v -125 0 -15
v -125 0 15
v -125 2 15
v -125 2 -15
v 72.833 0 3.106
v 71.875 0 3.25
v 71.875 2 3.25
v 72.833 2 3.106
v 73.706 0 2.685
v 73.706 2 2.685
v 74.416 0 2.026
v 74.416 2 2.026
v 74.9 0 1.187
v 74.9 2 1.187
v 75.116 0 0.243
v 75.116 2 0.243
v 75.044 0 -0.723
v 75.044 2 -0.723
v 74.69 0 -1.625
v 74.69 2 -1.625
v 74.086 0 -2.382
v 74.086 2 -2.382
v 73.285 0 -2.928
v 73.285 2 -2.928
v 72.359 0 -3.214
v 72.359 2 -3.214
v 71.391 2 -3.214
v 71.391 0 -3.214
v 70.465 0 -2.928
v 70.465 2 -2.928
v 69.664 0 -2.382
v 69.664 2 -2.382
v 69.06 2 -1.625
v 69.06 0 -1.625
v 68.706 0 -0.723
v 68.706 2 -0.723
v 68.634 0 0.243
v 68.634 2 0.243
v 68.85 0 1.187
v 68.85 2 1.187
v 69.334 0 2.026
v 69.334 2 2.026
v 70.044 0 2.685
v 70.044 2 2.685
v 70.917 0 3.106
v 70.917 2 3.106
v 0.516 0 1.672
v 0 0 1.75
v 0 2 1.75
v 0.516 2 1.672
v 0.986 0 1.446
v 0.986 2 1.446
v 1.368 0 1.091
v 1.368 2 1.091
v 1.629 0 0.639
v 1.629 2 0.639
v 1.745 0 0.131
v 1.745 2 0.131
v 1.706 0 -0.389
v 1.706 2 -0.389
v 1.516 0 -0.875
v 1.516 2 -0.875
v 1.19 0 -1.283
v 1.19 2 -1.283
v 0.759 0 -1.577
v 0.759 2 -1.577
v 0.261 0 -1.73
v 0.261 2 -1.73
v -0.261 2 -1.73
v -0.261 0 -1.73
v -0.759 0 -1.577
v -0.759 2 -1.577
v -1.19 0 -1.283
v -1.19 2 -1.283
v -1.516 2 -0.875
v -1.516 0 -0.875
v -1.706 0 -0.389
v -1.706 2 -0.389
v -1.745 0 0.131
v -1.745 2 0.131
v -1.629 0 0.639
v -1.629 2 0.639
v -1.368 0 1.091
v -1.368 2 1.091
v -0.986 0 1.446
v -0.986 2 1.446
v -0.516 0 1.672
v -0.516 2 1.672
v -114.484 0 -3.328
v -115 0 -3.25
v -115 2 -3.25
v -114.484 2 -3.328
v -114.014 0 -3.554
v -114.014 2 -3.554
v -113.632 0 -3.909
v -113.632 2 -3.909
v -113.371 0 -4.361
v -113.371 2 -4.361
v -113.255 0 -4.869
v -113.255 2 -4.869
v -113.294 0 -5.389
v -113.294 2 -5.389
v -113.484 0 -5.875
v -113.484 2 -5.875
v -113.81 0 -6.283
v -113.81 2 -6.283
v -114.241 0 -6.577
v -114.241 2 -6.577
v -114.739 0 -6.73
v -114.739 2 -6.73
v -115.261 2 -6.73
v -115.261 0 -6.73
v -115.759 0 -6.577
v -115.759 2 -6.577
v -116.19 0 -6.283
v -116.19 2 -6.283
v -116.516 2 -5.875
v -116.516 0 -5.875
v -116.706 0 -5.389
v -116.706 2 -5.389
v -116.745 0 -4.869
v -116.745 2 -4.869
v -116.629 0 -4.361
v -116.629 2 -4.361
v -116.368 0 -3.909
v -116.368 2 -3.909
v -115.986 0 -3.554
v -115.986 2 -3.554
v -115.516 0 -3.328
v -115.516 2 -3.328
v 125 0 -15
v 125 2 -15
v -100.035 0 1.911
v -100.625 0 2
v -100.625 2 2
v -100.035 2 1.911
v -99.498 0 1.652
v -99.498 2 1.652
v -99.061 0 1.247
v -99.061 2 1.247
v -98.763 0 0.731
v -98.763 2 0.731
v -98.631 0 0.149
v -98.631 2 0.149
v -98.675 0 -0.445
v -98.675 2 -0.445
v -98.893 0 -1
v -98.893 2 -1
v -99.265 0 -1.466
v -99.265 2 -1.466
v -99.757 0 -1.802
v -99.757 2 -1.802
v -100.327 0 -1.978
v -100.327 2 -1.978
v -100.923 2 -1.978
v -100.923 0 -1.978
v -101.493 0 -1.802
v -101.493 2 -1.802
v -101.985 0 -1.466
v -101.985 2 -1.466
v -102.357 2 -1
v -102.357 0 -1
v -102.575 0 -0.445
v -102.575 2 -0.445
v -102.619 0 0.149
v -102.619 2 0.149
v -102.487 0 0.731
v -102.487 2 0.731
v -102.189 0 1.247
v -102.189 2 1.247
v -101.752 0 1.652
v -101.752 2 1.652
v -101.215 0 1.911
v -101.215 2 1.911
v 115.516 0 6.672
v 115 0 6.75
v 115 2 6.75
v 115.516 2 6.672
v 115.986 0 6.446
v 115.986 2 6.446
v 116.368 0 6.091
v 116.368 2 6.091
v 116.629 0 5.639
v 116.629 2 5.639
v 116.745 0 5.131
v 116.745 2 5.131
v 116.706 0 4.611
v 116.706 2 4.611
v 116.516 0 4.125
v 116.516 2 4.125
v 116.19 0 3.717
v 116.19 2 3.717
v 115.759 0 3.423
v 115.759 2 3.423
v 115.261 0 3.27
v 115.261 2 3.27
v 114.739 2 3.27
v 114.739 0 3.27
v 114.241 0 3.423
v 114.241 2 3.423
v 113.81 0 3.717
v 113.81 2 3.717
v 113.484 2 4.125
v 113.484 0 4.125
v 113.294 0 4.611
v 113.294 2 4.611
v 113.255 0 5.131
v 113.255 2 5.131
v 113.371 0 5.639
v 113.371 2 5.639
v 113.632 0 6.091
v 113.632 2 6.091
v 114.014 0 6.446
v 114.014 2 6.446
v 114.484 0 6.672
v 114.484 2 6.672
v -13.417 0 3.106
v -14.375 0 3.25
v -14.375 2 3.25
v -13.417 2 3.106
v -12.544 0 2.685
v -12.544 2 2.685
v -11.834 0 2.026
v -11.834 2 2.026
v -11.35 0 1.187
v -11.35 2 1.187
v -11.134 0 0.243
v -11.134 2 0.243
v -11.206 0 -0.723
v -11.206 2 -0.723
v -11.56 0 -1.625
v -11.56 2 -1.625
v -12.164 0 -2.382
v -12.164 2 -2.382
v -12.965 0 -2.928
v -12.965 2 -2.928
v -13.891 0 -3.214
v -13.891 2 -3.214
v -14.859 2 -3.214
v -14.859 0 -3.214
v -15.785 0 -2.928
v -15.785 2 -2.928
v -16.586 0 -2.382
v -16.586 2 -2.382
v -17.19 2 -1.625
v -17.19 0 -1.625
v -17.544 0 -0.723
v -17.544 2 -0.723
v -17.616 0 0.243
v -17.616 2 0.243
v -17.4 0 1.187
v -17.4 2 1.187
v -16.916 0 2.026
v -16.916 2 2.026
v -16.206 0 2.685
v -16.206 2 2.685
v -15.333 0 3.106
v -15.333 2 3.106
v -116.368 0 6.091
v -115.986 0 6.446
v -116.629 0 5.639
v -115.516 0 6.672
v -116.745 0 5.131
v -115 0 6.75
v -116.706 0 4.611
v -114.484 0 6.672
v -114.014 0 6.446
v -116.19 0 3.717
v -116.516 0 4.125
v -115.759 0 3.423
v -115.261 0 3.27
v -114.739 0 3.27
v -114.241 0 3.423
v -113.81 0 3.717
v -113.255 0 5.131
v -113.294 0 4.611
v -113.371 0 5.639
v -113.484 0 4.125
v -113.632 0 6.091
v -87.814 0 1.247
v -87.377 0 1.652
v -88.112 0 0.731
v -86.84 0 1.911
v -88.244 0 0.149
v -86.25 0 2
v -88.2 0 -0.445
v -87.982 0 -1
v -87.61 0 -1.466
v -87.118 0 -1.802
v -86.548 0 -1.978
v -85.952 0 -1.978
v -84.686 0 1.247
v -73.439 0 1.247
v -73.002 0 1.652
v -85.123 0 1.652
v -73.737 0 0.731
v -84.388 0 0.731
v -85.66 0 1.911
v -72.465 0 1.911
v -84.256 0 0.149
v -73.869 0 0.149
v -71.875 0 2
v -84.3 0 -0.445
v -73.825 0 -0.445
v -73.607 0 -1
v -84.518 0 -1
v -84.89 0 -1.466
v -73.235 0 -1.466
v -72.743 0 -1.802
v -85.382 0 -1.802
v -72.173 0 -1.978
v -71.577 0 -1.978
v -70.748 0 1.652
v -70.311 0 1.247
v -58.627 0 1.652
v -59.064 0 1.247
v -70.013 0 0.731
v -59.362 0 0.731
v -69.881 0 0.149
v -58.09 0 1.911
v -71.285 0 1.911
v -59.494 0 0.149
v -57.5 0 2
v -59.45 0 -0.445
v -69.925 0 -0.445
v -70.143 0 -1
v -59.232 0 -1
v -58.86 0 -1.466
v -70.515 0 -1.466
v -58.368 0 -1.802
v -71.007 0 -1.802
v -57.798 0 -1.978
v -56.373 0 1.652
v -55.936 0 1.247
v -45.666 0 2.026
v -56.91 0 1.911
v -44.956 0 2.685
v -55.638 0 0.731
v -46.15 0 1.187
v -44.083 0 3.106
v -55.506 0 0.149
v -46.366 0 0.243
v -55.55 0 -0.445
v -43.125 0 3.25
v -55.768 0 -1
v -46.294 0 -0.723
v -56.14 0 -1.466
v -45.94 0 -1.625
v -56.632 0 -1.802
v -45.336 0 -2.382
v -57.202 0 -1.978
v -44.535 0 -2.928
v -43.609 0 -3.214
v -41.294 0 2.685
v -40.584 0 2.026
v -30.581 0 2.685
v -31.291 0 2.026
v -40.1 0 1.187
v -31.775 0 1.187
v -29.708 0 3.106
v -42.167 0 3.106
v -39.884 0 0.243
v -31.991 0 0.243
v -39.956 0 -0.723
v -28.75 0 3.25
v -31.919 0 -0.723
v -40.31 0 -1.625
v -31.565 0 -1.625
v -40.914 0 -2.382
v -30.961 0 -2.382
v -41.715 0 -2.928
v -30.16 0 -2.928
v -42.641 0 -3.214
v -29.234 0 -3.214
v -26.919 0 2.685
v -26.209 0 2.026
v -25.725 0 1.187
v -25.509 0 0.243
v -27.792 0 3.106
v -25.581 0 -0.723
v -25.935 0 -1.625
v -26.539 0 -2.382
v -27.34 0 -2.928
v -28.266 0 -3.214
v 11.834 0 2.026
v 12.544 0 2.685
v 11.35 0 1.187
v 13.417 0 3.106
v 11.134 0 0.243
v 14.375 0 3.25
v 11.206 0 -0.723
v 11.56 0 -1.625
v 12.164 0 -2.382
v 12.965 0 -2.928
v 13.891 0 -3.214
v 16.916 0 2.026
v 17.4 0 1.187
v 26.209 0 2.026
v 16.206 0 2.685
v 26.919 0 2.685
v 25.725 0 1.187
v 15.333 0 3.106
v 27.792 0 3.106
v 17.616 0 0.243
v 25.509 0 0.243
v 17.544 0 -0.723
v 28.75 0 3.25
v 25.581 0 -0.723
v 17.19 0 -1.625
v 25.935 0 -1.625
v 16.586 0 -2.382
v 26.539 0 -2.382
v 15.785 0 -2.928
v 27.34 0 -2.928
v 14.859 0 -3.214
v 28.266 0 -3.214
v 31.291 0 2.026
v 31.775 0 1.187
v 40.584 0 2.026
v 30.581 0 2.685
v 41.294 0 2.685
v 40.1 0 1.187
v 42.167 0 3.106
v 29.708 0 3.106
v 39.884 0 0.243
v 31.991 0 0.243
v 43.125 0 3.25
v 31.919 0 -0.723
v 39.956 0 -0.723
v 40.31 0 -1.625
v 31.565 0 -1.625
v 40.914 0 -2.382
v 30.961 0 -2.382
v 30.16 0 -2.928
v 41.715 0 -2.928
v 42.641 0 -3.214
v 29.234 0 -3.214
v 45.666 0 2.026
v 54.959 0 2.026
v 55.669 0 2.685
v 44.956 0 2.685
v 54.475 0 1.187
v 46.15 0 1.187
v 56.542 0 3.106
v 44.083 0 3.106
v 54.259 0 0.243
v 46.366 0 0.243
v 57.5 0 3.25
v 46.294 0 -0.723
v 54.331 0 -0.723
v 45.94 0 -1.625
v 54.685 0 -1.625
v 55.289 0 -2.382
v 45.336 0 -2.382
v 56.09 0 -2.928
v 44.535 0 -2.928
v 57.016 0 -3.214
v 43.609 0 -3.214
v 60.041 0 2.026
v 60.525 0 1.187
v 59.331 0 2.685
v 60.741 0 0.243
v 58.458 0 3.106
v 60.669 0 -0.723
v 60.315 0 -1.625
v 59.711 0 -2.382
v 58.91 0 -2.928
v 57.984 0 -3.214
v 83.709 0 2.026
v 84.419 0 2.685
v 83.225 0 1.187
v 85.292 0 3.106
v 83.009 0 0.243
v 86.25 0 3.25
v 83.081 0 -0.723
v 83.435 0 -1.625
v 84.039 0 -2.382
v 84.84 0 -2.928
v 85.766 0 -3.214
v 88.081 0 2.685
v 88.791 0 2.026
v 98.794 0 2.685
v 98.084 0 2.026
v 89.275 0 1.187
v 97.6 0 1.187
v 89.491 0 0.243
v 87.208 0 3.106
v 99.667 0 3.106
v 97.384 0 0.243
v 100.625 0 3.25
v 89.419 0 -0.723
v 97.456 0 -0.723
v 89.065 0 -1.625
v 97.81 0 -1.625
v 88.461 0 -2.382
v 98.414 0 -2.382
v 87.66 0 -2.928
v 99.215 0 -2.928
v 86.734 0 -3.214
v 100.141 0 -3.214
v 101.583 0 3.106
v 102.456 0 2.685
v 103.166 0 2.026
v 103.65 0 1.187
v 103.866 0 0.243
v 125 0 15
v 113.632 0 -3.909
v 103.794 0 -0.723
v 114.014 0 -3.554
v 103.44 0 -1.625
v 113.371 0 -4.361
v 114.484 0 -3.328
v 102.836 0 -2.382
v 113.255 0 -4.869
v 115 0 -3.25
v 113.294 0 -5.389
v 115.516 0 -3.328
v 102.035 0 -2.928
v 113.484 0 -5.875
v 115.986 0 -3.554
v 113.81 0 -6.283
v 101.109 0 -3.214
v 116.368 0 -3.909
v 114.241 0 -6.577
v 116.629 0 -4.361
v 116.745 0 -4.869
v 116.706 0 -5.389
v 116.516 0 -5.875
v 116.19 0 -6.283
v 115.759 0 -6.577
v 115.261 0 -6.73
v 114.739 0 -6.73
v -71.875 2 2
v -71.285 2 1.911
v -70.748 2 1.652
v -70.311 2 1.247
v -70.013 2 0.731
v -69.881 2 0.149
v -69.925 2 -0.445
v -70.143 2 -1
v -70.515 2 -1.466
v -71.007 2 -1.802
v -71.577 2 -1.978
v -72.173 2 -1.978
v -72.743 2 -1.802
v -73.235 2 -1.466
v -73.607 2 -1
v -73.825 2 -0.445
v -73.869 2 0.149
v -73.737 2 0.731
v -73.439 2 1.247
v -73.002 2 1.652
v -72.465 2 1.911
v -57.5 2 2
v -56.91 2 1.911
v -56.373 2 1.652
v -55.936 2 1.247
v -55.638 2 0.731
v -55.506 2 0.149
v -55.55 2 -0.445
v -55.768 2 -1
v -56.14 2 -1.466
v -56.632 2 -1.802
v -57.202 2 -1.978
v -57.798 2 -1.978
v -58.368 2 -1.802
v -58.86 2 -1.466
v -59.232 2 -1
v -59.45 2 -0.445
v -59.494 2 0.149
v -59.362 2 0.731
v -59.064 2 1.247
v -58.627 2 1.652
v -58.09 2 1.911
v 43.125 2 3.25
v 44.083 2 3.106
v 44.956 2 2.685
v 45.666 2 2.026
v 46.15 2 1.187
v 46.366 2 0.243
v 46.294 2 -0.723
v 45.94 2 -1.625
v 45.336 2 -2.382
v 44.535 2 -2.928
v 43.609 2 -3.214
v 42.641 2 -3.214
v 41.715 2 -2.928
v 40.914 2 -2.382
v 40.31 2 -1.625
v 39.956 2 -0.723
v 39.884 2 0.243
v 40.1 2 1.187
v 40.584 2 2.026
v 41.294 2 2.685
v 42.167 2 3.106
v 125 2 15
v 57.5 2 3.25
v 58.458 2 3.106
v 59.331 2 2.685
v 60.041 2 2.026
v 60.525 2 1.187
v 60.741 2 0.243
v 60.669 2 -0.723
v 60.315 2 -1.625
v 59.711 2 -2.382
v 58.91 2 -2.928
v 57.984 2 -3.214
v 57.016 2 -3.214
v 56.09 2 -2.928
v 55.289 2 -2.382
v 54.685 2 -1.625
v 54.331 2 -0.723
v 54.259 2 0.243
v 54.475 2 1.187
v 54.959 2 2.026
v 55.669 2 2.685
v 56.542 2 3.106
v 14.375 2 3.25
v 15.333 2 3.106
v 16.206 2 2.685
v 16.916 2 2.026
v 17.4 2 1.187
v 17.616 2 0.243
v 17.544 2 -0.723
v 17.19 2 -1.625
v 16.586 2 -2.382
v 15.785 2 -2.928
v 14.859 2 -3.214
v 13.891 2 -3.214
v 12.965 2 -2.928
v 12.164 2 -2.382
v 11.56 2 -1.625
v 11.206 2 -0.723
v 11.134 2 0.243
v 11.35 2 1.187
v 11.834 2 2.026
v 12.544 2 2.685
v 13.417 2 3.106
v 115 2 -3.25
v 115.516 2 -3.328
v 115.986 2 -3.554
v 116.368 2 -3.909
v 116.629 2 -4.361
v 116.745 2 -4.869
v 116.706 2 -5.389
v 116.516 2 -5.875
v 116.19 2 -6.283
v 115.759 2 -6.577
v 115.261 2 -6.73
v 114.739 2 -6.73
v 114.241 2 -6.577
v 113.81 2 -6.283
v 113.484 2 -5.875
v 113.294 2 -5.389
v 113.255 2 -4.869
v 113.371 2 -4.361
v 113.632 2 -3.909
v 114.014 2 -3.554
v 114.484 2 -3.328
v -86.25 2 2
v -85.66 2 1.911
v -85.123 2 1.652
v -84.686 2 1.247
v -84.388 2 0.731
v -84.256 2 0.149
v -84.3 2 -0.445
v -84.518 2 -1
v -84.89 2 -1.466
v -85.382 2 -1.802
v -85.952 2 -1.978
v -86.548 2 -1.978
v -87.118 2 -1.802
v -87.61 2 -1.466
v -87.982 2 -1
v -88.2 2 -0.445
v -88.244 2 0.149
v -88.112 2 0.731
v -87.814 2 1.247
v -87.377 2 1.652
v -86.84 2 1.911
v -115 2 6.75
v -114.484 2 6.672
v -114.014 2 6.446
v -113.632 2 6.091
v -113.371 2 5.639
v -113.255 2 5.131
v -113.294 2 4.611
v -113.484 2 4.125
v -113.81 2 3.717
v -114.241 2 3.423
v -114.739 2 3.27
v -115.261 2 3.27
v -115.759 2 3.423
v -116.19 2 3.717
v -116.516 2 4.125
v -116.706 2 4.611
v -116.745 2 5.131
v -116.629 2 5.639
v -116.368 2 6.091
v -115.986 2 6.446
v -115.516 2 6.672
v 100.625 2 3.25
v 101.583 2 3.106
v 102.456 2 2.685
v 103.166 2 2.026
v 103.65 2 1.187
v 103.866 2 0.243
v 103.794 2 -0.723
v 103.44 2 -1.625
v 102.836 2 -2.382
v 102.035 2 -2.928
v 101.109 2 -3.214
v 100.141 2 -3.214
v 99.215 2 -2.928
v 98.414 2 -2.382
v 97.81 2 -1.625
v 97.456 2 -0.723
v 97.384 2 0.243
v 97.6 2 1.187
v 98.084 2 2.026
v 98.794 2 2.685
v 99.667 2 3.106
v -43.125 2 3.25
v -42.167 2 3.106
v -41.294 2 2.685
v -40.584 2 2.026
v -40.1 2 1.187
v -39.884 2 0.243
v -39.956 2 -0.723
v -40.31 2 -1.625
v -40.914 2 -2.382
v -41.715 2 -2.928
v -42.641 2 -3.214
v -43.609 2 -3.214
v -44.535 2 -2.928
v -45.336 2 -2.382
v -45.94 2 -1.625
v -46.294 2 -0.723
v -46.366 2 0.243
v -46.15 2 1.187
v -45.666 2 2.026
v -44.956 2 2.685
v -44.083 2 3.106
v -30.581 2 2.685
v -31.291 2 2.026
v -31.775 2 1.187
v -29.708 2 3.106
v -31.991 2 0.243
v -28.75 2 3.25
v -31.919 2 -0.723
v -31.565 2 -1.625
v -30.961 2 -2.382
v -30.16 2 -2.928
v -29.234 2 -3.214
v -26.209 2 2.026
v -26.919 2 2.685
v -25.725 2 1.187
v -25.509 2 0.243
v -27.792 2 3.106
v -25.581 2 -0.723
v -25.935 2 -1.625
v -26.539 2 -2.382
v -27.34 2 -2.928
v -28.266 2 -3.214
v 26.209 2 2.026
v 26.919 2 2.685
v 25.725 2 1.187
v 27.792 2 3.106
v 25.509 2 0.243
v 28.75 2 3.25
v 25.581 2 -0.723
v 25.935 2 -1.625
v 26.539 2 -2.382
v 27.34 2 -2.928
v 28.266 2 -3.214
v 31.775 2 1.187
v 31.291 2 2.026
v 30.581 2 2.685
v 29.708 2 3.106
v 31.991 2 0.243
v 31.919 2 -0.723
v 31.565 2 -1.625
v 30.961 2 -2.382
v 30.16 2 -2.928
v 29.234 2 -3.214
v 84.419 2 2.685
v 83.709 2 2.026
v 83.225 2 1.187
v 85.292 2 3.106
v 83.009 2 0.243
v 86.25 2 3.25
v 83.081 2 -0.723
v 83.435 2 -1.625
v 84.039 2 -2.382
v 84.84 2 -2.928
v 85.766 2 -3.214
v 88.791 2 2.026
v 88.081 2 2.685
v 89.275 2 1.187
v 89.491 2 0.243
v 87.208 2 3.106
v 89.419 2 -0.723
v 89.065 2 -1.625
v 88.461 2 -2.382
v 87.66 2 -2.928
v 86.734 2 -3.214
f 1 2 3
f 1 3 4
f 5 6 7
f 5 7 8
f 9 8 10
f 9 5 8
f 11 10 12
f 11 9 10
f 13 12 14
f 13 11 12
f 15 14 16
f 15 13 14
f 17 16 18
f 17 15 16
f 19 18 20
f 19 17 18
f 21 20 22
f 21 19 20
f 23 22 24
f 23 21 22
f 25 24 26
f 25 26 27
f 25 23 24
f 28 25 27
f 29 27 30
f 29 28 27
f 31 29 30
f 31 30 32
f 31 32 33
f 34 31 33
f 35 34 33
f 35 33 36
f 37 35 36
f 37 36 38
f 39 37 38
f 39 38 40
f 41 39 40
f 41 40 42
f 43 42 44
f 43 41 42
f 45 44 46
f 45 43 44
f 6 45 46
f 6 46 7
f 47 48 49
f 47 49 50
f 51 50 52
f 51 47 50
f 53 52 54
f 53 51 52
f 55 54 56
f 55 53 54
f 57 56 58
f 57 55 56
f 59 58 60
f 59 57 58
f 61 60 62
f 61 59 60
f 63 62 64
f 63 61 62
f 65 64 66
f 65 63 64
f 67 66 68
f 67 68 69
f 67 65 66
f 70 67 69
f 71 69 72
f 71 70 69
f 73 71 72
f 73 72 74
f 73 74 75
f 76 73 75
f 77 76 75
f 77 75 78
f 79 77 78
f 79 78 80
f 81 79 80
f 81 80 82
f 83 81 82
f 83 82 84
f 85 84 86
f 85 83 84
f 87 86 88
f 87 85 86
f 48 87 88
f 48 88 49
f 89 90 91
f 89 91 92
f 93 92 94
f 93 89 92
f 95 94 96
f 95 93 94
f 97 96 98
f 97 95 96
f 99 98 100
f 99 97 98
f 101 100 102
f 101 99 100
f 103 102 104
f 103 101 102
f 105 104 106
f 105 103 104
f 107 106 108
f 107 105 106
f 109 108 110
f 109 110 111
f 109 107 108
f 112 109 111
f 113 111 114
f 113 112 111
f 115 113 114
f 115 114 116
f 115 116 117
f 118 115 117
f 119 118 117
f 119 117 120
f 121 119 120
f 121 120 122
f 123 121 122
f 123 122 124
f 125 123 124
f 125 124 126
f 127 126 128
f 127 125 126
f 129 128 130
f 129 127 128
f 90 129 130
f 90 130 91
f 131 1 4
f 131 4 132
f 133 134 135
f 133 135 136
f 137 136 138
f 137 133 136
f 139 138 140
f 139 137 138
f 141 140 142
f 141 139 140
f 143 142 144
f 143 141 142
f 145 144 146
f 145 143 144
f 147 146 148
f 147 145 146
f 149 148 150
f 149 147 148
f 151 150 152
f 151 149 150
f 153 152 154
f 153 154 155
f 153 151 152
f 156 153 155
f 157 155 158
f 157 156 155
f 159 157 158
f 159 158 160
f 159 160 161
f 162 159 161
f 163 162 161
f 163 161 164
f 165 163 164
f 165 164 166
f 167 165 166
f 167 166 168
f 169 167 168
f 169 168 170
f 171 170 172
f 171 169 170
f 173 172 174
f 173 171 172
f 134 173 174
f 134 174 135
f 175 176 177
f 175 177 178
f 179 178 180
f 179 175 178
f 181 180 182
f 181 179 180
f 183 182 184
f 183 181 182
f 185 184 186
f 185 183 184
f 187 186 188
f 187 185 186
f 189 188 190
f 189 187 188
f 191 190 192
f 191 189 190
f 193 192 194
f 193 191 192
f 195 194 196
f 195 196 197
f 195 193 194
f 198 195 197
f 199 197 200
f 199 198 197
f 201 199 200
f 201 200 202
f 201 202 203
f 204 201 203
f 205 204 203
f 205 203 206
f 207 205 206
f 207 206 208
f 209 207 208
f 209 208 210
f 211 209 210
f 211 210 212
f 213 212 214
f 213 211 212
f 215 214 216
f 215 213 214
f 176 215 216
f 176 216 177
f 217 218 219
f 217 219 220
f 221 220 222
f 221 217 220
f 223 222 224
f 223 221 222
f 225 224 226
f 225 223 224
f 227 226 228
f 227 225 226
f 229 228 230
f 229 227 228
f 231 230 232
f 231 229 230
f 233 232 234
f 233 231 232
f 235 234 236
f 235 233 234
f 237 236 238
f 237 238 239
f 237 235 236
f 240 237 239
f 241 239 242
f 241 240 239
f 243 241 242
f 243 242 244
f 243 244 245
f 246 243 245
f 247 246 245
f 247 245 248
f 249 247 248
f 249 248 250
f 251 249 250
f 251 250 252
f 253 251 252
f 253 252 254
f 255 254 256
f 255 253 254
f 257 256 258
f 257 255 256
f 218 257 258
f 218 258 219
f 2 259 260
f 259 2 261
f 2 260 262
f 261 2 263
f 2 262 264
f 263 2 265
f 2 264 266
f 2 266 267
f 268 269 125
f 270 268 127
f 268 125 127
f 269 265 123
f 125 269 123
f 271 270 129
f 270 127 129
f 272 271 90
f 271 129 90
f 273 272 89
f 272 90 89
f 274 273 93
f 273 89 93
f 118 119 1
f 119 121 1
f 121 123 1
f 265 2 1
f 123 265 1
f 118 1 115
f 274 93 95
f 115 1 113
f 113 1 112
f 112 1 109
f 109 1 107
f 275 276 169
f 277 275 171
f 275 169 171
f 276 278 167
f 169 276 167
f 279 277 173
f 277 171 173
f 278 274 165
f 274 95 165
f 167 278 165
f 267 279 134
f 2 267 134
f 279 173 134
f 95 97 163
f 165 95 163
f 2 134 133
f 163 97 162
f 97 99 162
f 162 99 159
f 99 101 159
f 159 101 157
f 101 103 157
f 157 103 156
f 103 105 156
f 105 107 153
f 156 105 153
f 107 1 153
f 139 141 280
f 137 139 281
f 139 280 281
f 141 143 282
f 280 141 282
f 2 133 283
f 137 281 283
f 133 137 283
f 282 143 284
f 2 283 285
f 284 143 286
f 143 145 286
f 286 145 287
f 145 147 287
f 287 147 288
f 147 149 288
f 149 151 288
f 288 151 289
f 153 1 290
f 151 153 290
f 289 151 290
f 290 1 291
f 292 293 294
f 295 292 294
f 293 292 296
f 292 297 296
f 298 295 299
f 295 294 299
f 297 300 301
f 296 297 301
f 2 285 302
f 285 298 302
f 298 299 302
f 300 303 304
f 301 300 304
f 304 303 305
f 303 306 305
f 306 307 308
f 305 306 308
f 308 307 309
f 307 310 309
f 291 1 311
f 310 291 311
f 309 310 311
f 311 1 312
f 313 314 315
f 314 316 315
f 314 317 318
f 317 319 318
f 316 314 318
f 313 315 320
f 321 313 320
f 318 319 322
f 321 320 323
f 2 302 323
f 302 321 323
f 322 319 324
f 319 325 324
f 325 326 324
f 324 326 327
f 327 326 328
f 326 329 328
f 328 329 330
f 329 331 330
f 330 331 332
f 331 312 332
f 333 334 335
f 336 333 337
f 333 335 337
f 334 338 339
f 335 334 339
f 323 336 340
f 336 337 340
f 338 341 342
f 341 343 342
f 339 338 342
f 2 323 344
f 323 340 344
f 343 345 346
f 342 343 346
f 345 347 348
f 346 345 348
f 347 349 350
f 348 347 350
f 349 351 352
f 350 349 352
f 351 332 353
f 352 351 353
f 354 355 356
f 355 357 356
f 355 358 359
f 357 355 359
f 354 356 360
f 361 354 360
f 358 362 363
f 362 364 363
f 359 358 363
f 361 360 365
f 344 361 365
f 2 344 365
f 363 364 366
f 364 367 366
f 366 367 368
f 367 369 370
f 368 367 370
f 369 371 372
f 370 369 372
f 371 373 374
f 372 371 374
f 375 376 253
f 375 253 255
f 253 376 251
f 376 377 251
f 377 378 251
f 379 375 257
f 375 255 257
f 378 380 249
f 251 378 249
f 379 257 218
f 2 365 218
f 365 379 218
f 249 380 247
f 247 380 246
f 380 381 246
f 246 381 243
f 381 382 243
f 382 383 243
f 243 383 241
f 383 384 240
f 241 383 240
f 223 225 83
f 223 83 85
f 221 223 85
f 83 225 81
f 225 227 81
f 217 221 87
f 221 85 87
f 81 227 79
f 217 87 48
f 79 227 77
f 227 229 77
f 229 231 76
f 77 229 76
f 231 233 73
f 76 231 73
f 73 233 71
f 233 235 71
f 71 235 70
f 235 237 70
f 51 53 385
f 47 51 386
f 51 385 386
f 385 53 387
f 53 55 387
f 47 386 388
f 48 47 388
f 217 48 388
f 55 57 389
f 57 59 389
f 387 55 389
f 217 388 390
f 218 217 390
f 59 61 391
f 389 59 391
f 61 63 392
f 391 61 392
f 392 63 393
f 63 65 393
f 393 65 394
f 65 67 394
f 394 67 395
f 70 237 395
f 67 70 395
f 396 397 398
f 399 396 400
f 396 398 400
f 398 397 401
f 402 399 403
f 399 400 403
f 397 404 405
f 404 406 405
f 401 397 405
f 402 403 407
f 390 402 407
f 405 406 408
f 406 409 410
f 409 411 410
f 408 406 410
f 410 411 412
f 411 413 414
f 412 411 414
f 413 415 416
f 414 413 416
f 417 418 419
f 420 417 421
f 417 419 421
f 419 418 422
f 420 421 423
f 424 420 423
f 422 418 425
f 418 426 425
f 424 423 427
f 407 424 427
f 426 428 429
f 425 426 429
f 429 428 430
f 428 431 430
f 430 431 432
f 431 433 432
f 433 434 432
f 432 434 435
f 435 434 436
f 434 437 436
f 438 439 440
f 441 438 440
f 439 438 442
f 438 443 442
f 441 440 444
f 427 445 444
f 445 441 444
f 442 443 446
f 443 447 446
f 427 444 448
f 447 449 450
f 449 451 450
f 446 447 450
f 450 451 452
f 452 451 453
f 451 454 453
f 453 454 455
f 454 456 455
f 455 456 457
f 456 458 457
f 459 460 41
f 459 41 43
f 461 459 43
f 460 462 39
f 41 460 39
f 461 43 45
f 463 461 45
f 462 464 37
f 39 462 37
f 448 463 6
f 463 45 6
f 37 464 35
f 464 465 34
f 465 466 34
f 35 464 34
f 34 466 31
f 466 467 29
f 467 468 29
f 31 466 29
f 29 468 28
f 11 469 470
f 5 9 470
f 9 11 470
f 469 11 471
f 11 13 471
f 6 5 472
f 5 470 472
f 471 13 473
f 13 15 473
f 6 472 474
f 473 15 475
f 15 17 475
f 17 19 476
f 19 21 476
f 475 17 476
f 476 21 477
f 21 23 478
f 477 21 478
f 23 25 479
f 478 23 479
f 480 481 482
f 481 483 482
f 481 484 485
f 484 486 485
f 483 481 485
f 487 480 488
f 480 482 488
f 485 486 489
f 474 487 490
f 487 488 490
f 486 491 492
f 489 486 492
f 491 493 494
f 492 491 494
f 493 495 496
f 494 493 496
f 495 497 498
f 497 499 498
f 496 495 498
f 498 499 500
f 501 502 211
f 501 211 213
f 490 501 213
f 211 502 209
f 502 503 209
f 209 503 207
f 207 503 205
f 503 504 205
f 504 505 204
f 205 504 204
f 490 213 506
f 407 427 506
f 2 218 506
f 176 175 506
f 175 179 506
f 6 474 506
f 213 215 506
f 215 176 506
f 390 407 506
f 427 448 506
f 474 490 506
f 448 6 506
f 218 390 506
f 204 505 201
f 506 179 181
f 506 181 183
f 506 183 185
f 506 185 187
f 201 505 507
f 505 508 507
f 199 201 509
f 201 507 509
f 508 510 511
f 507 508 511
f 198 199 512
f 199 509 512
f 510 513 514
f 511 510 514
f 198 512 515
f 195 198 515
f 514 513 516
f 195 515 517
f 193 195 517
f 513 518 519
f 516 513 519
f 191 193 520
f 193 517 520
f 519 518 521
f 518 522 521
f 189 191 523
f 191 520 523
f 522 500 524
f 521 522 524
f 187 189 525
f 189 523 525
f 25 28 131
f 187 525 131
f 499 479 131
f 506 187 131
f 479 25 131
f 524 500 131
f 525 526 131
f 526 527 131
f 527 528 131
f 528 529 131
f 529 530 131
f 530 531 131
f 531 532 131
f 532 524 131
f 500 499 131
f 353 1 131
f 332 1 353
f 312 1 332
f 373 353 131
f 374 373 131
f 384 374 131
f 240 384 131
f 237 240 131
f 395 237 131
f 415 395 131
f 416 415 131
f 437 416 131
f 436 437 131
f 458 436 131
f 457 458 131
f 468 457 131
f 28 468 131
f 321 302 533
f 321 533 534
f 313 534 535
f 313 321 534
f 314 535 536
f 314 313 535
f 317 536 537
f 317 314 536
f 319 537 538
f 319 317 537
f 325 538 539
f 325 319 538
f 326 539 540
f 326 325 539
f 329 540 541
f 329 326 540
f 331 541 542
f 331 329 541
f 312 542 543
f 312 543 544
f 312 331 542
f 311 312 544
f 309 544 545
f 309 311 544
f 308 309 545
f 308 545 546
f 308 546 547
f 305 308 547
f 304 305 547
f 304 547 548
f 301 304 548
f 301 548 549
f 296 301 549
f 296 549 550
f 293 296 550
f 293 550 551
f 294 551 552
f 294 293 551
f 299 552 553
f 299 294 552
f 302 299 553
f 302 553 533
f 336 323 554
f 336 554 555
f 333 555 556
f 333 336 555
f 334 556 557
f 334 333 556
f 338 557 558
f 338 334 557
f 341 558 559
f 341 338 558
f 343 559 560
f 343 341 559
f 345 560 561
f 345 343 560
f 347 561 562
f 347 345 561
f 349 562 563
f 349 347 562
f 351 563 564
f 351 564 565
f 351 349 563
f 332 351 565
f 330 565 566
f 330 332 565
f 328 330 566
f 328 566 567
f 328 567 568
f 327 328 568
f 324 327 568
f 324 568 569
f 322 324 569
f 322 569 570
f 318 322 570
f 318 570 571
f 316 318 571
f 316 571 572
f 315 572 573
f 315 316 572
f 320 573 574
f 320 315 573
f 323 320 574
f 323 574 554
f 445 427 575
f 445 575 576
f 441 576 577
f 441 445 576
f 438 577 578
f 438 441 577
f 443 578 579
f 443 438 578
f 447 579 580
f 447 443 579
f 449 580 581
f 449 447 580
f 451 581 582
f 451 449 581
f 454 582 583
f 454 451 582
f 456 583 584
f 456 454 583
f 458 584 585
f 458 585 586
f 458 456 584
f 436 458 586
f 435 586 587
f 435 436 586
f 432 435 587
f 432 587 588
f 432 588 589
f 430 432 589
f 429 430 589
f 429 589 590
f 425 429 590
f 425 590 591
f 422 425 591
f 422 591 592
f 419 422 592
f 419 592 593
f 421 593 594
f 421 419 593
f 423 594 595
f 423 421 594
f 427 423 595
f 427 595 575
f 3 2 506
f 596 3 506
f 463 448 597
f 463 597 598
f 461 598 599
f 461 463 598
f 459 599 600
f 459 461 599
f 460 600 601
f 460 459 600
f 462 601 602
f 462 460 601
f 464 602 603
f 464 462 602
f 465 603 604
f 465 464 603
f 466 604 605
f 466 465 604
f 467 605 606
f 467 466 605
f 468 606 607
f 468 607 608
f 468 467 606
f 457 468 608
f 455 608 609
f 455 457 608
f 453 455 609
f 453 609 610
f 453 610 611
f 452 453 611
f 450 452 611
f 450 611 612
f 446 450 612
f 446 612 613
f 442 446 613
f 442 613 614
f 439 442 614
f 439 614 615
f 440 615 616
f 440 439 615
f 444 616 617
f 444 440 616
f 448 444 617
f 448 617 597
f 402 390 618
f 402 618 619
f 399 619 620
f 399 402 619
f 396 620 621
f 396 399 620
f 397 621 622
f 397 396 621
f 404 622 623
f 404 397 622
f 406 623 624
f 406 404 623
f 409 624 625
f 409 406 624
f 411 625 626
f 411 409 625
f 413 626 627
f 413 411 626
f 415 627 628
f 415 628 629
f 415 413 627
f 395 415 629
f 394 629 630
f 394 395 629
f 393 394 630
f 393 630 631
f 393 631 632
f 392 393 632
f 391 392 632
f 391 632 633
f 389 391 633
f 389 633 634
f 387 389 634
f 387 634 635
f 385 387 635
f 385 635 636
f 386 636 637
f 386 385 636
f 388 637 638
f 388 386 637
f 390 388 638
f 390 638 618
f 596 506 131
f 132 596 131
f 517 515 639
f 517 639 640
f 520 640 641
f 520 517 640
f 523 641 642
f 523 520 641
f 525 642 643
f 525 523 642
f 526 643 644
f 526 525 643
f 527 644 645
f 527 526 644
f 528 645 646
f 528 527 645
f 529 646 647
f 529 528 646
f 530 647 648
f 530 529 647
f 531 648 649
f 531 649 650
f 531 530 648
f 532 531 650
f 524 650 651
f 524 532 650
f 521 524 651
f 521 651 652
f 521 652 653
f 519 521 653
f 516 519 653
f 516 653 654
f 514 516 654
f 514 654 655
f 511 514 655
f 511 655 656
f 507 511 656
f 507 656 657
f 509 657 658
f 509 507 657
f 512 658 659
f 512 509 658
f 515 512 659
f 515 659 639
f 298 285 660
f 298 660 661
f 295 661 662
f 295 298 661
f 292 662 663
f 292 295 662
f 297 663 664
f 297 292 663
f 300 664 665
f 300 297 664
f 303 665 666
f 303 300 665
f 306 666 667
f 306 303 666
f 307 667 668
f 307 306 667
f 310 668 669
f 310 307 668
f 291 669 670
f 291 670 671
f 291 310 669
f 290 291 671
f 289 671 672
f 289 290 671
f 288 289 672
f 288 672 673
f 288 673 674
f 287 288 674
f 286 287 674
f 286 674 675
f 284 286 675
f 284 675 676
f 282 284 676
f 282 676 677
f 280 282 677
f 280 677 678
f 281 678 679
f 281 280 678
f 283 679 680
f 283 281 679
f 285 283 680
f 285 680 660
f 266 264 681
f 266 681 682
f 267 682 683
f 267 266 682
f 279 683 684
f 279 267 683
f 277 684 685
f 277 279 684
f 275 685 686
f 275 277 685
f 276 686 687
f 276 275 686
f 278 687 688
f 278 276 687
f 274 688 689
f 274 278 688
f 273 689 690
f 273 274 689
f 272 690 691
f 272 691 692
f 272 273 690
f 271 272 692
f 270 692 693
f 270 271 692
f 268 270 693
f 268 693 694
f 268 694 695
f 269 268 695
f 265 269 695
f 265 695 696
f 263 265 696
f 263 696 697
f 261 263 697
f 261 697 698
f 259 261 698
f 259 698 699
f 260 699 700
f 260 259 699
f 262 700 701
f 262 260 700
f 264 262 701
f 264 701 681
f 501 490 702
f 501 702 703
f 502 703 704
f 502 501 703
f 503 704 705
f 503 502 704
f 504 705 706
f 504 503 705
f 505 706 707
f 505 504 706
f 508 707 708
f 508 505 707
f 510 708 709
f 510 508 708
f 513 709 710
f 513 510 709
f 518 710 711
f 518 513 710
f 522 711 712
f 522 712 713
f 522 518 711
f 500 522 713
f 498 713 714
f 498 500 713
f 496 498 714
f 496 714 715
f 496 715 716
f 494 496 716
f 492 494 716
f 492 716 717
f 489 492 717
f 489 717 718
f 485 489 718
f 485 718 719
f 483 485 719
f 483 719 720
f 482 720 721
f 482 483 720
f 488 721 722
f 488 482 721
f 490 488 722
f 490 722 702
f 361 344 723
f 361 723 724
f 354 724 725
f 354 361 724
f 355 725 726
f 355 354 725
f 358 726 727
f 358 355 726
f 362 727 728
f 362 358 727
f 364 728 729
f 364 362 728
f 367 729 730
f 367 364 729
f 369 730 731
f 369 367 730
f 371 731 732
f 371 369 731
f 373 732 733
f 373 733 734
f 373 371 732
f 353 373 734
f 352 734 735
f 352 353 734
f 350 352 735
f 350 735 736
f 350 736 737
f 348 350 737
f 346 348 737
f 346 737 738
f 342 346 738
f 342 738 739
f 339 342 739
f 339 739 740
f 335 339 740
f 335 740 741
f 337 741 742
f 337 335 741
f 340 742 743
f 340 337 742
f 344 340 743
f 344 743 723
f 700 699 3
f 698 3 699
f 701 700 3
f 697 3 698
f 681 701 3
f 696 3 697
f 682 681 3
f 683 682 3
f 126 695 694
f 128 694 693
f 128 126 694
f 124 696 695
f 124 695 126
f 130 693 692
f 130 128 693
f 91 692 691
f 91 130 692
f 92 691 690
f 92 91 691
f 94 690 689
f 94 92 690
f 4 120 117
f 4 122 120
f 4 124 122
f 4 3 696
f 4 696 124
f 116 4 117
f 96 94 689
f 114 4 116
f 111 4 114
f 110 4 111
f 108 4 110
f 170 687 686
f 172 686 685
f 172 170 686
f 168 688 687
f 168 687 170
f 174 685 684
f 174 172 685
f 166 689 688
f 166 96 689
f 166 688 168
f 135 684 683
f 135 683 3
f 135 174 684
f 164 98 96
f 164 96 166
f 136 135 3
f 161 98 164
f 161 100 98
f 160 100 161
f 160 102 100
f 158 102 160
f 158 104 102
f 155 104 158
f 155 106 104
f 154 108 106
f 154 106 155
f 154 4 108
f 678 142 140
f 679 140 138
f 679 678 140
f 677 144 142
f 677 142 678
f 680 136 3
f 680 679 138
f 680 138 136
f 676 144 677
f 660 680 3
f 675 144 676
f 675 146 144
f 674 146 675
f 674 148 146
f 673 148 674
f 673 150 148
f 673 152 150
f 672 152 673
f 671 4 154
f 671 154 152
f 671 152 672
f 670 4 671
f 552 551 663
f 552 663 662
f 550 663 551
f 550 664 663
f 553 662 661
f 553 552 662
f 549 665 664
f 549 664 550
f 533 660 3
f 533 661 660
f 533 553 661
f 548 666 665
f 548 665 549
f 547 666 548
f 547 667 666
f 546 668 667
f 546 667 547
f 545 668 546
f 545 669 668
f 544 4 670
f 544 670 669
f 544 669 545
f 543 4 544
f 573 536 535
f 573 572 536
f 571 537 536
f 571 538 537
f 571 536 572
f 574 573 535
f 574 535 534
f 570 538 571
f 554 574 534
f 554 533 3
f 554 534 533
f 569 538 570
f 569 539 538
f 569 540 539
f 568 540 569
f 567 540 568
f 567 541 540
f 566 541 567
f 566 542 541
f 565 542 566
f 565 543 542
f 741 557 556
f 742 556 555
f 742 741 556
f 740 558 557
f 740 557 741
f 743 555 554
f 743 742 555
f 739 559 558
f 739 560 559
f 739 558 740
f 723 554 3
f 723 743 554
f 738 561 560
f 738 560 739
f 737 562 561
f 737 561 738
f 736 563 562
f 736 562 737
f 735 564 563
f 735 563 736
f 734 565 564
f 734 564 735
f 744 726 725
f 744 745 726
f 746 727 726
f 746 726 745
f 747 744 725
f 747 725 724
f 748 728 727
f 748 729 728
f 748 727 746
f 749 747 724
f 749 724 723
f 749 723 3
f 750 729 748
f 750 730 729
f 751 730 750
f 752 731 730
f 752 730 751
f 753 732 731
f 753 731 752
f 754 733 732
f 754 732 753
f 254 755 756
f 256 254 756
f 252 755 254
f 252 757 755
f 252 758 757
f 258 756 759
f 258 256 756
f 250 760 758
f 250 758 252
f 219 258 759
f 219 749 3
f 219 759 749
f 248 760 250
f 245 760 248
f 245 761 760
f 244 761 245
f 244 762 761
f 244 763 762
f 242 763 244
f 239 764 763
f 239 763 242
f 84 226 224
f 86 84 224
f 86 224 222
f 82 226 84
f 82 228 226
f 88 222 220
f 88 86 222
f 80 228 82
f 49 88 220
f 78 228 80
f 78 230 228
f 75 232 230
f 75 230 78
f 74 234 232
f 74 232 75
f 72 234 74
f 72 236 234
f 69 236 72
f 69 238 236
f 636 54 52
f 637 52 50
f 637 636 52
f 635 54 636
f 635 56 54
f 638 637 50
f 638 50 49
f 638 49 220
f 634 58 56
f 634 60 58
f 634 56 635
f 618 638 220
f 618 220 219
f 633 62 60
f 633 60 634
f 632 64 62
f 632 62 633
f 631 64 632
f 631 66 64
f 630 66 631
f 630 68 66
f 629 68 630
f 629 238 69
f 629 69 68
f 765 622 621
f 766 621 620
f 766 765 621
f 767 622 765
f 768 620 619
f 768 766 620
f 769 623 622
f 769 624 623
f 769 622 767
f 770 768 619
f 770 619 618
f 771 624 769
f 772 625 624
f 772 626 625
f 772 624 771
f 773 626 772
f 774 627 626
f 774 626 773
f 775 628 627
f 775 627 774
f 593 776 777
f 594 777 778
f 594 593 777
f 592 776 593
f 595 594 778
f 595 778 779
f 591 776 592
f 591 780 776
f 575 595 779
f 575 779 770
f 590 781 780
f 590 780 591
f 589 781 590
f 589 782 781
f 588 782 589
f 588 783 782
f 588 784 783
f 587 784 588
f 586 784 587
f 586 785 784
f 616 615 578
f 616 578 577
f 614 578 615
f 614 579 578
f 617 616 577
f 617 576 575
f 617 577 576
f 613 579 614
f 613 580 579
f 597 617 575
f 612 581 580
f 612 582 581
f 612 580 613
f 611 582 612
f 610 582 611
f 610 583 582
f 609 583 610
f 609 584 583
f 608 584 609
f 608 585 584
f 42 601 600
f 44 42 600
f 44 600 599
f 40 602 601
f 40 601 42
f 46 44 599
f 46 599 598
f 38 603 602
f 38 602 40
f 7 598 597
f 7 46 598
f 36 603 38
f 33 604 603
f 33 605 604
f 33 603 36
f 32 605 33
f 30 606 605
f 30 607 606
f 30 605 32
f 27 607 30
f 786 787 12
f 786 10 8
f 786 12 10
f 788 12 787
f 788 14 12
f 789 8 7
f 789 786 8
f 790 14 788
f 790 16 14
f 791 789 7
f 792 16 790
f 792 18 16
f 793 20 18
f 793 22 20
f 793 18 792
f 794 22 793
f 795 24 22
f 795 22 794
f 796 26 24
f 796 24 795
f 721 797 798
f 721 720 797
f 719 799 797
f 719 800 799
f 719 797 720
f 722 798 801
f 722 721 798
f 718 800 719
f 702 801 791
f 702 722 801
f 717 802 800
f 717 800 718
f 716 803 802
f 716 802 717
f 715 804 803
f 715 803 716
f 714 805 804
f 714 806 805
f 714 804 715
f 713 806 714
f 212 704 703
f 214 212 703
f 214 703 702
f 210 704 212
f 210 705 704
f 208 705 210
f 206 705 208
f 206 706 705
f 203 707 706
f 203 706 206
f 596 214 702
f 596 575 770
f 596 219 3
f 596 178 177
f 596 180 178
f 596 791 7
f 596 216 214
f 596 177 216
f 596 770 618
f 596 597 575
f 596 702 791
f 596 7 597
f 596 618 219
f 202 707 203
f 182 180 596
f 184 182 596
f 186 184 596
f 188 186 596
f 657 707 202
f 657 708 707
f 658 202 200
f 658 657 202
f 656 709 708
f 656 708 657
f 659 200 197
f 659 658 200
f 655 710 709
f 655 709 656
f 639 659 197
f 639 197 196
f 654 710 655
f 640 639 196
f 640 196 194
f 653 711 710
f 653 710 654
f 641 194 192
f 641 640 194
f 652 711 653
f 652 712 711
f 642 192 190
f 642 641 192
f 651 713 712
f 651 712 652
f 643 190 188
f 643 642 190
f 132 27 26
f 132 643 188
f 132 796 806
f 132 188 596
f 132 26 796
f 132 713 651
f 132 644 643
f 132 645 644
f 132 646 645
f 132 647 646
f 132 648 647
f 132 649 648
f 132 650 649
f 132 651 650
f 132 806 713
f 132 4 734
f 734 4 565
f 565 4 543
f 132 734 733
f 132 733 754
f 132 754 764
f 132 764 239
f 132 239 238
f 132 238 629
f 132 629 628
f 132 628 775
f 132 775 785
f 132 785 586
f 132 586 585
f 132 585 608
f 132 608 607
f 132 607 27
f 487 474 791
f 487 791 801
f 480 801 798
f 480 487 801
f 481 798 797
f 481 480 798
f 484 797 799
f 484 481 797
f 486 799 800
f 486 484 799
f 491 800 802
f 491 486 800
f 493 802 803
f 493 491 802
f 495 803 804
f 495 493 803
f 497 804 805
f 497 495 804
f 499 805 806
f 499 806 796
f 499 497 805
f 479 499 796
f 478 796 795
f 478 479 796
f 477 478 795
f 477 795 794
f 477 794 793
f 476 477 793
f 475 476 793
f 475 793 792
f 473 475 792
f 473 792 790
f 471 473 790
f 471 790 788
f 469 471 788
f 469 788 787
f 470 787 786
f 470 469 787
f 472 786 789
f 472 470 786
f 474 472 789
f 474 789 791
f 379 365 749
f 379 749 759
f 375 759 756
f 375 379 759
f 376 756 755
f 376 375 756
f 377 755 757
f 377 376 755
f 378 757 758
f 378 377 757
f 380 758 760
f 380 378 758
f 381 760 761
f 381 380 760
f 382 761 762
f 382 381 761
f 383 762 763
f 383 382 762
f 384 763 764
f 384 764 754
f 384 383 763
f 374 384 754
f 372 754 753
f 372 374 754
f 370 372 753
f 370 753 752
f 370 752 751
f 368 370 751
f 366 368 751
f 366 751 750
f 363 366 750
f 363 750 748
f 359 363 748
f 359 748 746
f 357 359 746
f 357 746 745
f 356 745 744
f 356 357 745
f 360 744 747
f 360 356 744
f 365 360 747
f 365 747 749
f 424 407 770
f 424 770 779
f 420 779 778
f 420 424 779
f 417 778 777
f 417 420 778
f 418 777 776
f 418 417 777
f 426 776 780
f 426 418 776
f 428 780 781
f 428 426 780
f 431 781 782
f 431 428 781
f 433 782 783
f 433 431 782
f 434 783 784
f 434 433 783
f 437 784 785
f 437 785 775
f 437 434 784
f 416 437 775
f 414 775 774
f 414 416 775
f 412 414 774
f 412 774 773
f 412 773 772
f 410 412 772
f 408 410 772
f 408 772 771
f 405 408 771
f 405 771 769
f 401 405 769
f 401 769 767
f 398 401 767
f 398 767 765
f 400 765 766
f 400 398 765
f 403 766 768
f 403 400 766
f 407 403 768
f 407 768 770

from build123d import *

# Parameters (mm, degrees)
SKETCH1_W           = 250
SKETCH1_H           = 30
SKETCH1_R           = 1.75
SKETCH1_R_2         = 2
SKETCH1_R_3         = 3.25
BOSS_EXTRUDE1_DEPTH = 2


with BuildPart() as part:
    # Sketch1 → Boss-Extrude1 (new body)
    with BuildSketch(Plane(origin=(0, 0, 0), x_dir=(1, 0, 0), z_dir=(0, 1, 0))):
        Rectangle(SKETCH1_W, SKETCH1_H)
        with Locations(Location((-115, 5, 0), (0, 0, 270))):
            Circle(SKETCH1_R, mode=Mode.SUBTRACT)
        with Locations(Location((-115, -5, 0), (0, 0, 270))):
            Circle(SKETCH1_R, mode=Mode.SUBTRACT)
        with Locations(Location((0, 0, 0), (0, 0, 270))):
            Circle(SKETCH1_R, mode=Mode.SUBTRACT)
        with Locations(Location((115, 5, 0), (0, 0, 270))):
            Circle(SKETCH1_R, mode=Mode.SUBTRACT)
        with Locations(Location((115, -5, 0), (0, 0, 270))):
            Circle(SKETCH1_R, mode=Mode.SUBTRACT)
        with Locations(Location((-100.625, 0, 0), (0, 0, 270))):
            Circle(SKETCH1_R_2, mode=Mode.SUBTRACT)
        with Locations(Location((-71.875, 0, 0), (0, 0, 270))):
            Circle(SKETCH1_R_2, mode=Mode.SUBTRACT)
        with Locations(Location((-57.5, 0, 0), (0, 0, 270))):
            Circle(SKETCH1_R_2, mode=Mode.SUBTRACT)
        with Locations(Location((14.375, 0, 0), (0, 0, 270))):
            Circle(SKETCH1_R_3, mode=Mode.SUBTRACT)
        with Locations(Location((43.125, 0, 0), (0, 0, 270))):
            Circle(SKETCH1_R_3, mode=Mode.SUBTRACT)
        with Locations(Location((57.5, 0, 0), (0, 0, 270))):
            Circle(SKETCH1_R_3, mode=Mode.SUBTRACT)
        with Locations(Location((71.875, 0, 0), (0, 0, 270))):
            Circle(SKETCH1_R_3, mode=Mode.SUBTRACT)
        with Locations(Location((86.25, 0, 0), (0, 0, 270))):
            Circle(SKETCH1_R_3, mode=Mode.SUBTRACT)
        with Locations(Location((100.625, 0, 0), (0, 0, 270))):
            Circle(SKETCH1_R_3, mode=Mode.SUBTRACT)
        with Locations(Location((-43.125, 0, 0), (0, 0, 270))):
            Circle(SKETCH1_R_3, mode=Mode.SUBTRACT)
        with Locations(Location((-86.25, 0, 0), (0, 0, 270))):
            Circle(SKETCH1_R_2, mode=Mode.SUBTRACT)
        with Locations(Location((-28.75, 0, 0), (0, 0, 270))):
            Circle(SKETCH1_R_3, mode=Mode.SUBTRACT)
        with Locations(Location((-14.375, 0, 0), (0, 0, 270))):
            Circle(SKETCH1_R_3, mode=Mode.SUBTRACT)
        with Locations(Location((28.75, 0, 0), (0, 0, 270))):
            Circle(SKETCH1_R_3, mode=Mode.SUBTRACT)
    extrude(amount=BOSS_EXTRUDE1_DEPTH)


solid = part.part
